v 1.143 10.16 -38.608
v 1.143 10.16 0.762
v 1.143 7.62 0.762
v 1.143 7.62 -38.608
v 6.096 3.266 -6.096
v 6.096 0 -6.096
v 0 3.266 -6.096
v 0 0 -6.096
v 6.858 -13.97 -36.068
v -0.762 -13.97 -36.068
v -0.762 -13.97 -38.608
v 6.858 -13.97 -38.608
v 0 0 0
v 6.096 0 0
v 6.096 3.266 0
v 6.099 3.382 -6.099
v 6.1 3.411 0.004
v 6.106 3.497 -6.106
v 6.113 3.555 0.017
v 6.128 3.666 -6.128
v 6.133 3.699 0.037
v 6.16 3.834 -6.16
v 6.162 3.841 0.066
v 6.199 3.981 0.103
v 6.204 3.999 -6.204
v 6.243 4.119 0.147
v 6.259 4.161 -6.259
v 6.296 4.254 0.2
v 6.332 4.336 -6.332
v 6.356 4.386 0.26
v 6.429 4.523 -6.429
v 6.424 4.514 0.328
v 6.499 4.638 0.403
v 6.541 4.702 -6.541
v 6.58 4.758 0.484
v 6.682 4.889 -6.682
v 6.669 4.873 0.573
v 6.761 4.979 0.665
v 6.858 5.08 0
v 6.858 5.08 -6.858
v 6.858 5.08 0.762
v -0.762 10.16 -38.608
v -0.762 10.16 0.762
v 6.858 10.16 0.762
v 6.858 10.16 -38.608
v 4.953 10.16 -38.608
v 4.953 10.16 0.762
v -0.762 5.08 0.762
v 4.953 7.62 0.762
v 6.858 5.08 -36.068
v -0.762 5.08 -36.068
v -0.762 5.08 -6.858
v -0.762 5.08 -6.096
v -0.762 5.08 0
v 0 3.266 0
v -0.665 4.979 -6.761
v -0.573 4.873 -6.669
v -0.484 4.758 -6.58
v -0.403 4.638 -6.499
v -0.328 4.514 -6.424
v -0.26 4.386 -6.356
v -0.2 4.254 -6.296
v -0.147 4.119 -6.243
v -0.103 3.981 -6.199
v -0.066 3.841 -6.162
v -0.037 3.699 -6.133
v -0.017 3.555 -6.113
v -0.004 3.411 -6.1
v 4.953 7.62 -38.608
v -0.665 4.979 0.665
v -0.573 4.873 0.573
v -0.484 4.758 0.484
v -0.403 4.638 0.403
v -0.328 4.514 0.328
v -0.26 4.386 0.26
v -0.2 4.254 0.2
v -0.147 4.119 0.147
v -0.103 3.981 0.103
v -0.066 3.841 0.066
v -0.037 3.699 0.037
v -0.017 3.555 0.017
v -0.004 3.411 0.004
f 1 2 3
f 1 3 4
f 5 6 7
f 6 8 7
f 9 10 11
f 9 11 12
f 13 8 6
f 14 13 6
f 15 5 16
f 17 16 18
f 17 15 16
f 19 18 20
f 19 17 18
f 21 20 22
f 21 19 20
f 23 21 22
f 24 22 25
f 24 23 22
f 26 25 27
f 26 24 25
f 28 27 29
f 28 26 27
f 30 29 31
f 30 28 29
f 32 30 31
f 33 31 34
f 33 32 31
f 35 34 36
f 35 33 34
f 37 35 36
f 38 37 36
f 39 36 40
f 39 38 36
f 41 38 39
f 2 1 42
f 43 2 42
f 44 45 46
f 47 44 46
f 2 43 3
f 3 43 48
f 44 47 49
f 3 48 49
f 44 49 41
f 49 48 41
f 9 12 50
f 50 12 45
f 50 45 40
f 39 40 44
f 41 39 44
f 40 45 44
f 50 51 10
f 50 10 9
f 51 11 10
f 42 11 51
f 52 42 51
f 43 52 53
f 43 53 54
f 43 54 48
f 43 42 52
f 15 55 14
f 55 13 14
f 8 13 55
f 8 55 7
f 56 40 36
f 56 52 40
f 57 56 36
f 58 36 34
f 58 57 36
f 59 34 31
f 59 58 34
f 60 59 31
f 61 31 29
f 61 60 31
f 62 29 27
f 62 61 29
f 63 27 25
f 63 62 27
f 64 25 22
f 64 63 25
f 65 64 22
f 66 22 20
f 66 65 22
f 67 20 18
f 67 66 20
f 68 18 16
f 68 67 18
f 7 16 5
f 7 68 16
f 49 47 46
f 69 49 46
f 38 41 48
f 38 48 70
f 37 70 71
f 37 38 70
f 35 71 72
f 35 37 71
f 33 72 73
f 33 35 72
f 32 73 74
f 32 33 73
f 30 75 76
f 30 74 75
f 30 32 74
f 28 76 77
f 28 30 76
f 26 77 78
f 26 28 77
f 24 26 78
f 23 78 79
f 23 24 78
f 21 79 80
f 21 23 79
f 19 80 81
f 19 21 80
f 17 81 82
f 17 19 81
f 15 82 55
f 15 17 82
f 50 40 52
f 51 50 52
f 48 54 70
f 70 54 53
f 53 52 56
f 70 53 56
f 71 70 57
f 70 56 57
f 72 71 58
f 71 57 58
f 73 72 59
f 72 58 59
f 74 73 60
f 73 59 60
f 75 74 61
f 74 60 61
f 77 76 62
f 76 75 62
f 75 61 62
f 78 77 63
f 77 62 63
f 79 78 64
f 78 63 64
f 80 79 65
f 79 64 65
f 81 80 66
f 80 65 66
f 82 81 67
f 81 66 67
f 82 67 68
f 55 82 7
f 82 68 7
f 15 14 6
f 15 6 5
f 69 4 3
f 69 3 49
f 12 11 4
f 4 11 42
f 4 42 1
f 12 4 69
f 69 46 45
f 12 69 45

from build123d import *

# Parameters (mm, degrees)
SKETCH1_W           = 6.096
SKETCH1_H           = 6.096
BOSS_EXTRUDE1_DEPTH = 5.08
SKETCH2_W           = 7.62
SKETCH2_H           = 7.62
BOSS_EXTRUDE2_DEPTH = 5.08
FILLET1_R           = 2.54
FILLET2_R           = 2.54
SKETCH4_W           = 7.62
SKETCH4_H           = 5.08
BOSS_EXTRUDE4_DEPTH = 31.75
SKETCH5_W           = 3.81
SKETCH5_H           = 39.37
CUT_EXTRUDE1_DEPTH  = 2.54
SKETCH7_W           = 7.62
SKETCH7_H           = 2.54
BOSS_EXTRUDE5_DEPTH = 19.05


with BuildPart() as part:
    # Sketch1 → Boss-Extrude1 (new body)
    with BuildSketch(Plane(origin=(0, 0, 0), x_dir=(1, 0, 0), z_dir=(0, 1, 0))):
        with Locations((3.048, 3.048)):
            Rectangle(SKETCH1_W, SKETCH1_H)
    extrude(amount=BOSS_EXTRUDE1_DEPTH)

    # Sketch2 → Boss-Extrude2 (add)
    with BuildSketch(Plane(origin=(0, 5.08, 0), x_dir=(1, 0, 0), z_dir=(0, 1, 0))):
        with Locations((3.048, 3.048)):
            Rectangle(SKETCH2_W, SKETCH2_H)
    extrude(amount=BOSS_EXTRUDE2_DEPTH)

    # Fillet1
    # the kernel refuses this fillet: 2.54 mm, written as the material it adds along each edge
    with BuildSketch(Plane(origin=(0, 5.08, -6.096), x_dir=(-1, 0, 0), z_dir=(0, 0, 1))) as fillet1_piece_1:
        with BuildLine():
            CenterArc((2.54, 1.813922821), FILLET1_R, 180, 45.572995999)
            Line((0, 1.813922821), (-0.0508, 1.813922821))
            Line((-0.0508, 1.813922821), (-0.0508, 0))
            Line((-0.0508, 0), (0, -0.0508))
            ThreePointArc((0, -0.0508), (0.381, -0.0508), (0.72644, -0.036278456))
            Line((0.72644, -0.036278456), (0.762, 0))
        make_face()
    extrude(amount=6.096)

    # Fillet2
    # the kernel refuses this fillet: 2.54 mm, written as the material it adds along each edge
    with BuildSketch(Plane(origin=(6.096, 5.08, 0), x_dir=(0, -1, 0), z_dir=(-1, 0, 0))) as fillet2_piece_1_section:
        with BuildLine():
            CenterArc((1.813922821, 2.54), FILLET2_R, 224.427004001, 45.572995999)
            Line((0, 0.762), (-0.036278456, 0.72644))
            ThreePointArc((-0.036278456, 0.72644), (-0.0508, 0.381), (-0.0508, 0))
            Line((-0.0508, 0), (0, -0.0508))
            Line((0, -0.0508), (1.813922821, -0.0508))
            Line((1.813922821, -0.0508), (1.813922821, 0))
        make_face()
    fillet2_piece_1 = extrude(amount=6.858, mode=Mode.PRIVATE)
    fillet2_piece_1 = fillet2_piece_1 - Plane(origin=(-2.54, 3.266077179, 0.188412047), x_dir=(-1, 0, 0), z_dir=(0, 0, -1)) * Cylinder(2.54, 21, mode=Mode.PRIVATE)
    add(fillet2_piece_1)
    with BuildSketch(Plane(origin=(6.096, 5.08, 0), x_dir=(0, -1, 0), z_dir=(0, 0, -1))) as fillet2_piece_2:
        with BuildLine():
            CenterArc((1.813922821, -2.54), FILLET2_R, 90, 45.572995999)
            Line((0, -0.762), (-0.036278456, -0.72644))
            ThreePointArc((-0.036278456, -0.72644), (-0.0508, -0.381), (-0.0508, 0))
            Line((-0.0508, 0), (0, 0.0508))
            Line((0, 0.0508), (1.813922821, 0.0508))
            Line((1.813922821, 0.0508), (1.813922821, 0))
        make_face()
    extrude(amount=6.096)
    with BuildSketch(Plane(origin=(-0.762, 5.08, -6.096), x_dir=(0, 0, -1), z_dir=(1, 0, 0))) as fillet2_piece_3_section:
        with BuildLine():
            CenterArc((2.54, -1.813922821), FILLET2_R, 134.427004001, 45.572995999)
            Line((0, -1.813922821), (-0.0508, -1.813922821))
            Line((-0.0508, -1.813922821), (-0.0508, 0))
            Line((-0.0508, 0), (0, 0.0508))
            ThreePointArc((0, 0.0508), (0.381, 0.0508), (0.72644, 0.036278456))
            Line((0.72644, 0.036278456), (0.762, 0))
        make_face()
    fillet2_piece_3 = extrude(amount=6.858, mode=Mode.PRIVATE)
    fillet2_piece_3 = fillet2_piece_3 - Plane(origin=(-2.54, 3.266077179, -6.345051063), x_dir=(-1, 0, 0), z_dir=(0, 0, -1)) * Cylinder(2.54, 21, mode=Mode.PRIVATE)
    add(fillet2_piece_3)
    with BuildSketch(Plane(origin=(10.630807052, 5.08, 0), x_dir=(0, -1, 0), z_dir=(-1, 0, 0))) as fillet2_piece_4a_section:
        with BuildLine():
            CenterArc((1.813922821, 2.54), FILLET2_R, 224.427004001, 45.572995999)
            Line((0, 0.762), (-0.036278456, 0.72644))
            ThreePointArc((-0.036278456, 0.72644), (-0.0508, 0.381), (-0.0508, 0))
            Line((-0.0508, 0), (0, -0.0508))
            Line((0, -0.0508), (1.813922821, -0.0508))
            Line((1.813922821, -0.0508), (1.813922821, 0))
        make_face()
    fillet2_piece_4a = extrude(amount=11.392807052, mode=Mode.PRIVATE)
    fillet2_piece_4a = split(fillet2_piece_4a, bisect_by=Plane(origin=(6.096, 4.594869389, 0.188412047), z_dir=(1, 0, 0)), keep=Keep.TOP, mode=Mode.PRIVATE)
    fillet2_piece_4a = split(fillet2_piece_4a, bisect_by=Plane(origin=(6.858, 4.594869389, 0.188412047), z_dir=(-1, 0, 0)), keep=Keep.TOP, mode=Mode.PRIVATE)
    with BuildSketch(Plane(origin=(6.096, 5.08, 4.534807052), x_dir=(0, -1, 0), z_dir=(0, 0, -1))) as fillet2_piece_4b_section:
        with BuildLine():
            CenterArc((1.813922821, -2.54), FILLET2_R, 90, 45.572995999)
            Line((0, -0.762), (-0.036278456, -0.72644))
            ThreePointArc((-0.036278456, -0.72644), (-0.0508, -0.381), (-0.0508, 0))
            Line((-0.0508, 0), (0, 0.0508))
            Line((0, 0.0508), (1.813922821, 0.0508))
            Line((1.813922821, 0.0508), (1.813922821, 0))
        make_face()
    fillet2_piece_4b = extrude(amount=10.630807052, mode=Mode.PRIVATE)
    fillet2_piece_4b = split(fillet2_piece_4b, bisect_by=Plane(origin=(6.284412047, 4.594869389, 0), z_dir=(0, 0, 1)), keep=Keep.TOP, mode=Mode.PRIVATE)
    fillet2_piece_4b = split(fillet2_piece_4b, bisect_by=Plane(origin=(6.284412047, 4.594869389, 0.762), z_dir=(0, 0, -1)), keep=Keep.TOP, mode=Mode.PRIVATE)
    fillet2_piece_4 = fillet2_piece_4a & fillet2_piece_4b
    add(fillet2_piece_4)
    with BuildSketch(Plane(origin=(6.096, 5.08, 0), x_dir=(0, -1, 0), z_dir=(0, 0, -1))) as fillet2_piece_5a_section:
        with BuildLine():
            CenterArc((1.813922821, -2.54), FILLET2_R, 90, 45.572995999)
            Line((0, -0.762), (-0.036278456, -0.72644))
            ThreePointArc((-0.036278456, -0.72644), (-0.0508, -0.381), (-0.0508, 0))
            Line((-0.0508, 0), (0, 0.0508))
            Line((0, 0.0508), (1.813922821, 0.0508))
            Line((1.813922821, 0.0508), (1.813922821, 0))
        make_face()
    fillet2_piece_5a = extrude(amount=10.630807052, mode=Mode.PRIVATE)
    fillet2_piece_5a = split(fillet2_piece_5a, bisect_by=Plane(origin=(6.284412047, 4.594869389, -6.096), z_dir=(0, 0, -1)), keep=Keep.TOP, mode=Mode.PRIVATE)
    fillet2_piece_5a = split(fillet2_piece_5a, bisect_by=Plane(origin=(6.284412047, 4.594869389, -6.858), z_dir=(0, 0, 1)), keep=Keep.TOP, mode=Mode.PRIVATE)
    with BuildSketch(Plane(origin=(-0.762, 5.08, -6.096), x_dir=(0, 0, -1), z_dir=(1, 0, 0))) as fillet2_piece_5b_section:
        with BuildLine():
            CenterArc((2.54, -1.813922821), FILLET2_R, 134.427004001, 45.572995999)
            Line((0, -1.813922821), (-0.0508, -1.813922821))
            Line((-0.0508, -1.813922821), (-0.0508, 0))
            Line((-0.0508, 0), (0, 0.0508))
            ThreePointArc((0, 0.0508), (0.381, 0.0508), (0.72644, 0.036278456))
            Line((0.72644, 0.036278456), (0.762, 0))
        make_face()
    fillet2_piece_5b = extrude(amount=11.392807052, mode=Mode.PRIVATE)
    fillet2_piece_5b = split(fillet2_piece_5b, bisect_by=Plane(origin=(6.096, 4.594869389, -6.284412047), z_dir=(1, 0, 0)), keep=Keep.TOP, mode=Mode.PRIVATE)
    fillet2_piece_5b = split(fillet2_piece_5b, bisect_by=Plane(origin=(6.858, 4.594869389, -6.284412047), z_dir=(-1, 0, 0)), keep=Keep.TOP, mode=Mode.PRIVATE)
    fillet2_piece_5 = fillet2_piece_5a & fillet2_piece_5b
    add(fillet2_piece_5)

    # Sketch4 → Boss-Extrude4 (add)
    with BuildSketch(Plane(origin=(0, 0, -6.858), x_dir=(-1, 0, 0), z_dir=(0, 0, -1))):
        with Locations((-3.048, 7.62)):
            Rectangle(SKETCH4_W, SKETCH4_H)
    extrude(amount=BOSS_EXTRUDE4_DEPTH)

    # Sketch5 → Cut-Extrude1 (cut)
    with BuildSketch(Plane(origin=(0, 10.16, 0), x_dir=(1, 0, 0), z_dir=(0, 1, 0))):
        with Locations((3.048, 18.923)):
            Rectangle(SKETCH5_W, SKETCH5_H)
    extrude(amount=-CUT_EXTRUDE1_DEPTH, mode=Mode.SUBTRACT)

    # Sketch7 → Boss-Extrude5 (add)
    with BuildSketch(Plane.XZ.offset(-5.08)):
        with Locations((3.048, -37.338)):
            Rectangle(SKETCH7_W, SKETCH7_H)
    extrude(amount=BOSS_EXTRUDE5_DEPTH)


solid = part.part
